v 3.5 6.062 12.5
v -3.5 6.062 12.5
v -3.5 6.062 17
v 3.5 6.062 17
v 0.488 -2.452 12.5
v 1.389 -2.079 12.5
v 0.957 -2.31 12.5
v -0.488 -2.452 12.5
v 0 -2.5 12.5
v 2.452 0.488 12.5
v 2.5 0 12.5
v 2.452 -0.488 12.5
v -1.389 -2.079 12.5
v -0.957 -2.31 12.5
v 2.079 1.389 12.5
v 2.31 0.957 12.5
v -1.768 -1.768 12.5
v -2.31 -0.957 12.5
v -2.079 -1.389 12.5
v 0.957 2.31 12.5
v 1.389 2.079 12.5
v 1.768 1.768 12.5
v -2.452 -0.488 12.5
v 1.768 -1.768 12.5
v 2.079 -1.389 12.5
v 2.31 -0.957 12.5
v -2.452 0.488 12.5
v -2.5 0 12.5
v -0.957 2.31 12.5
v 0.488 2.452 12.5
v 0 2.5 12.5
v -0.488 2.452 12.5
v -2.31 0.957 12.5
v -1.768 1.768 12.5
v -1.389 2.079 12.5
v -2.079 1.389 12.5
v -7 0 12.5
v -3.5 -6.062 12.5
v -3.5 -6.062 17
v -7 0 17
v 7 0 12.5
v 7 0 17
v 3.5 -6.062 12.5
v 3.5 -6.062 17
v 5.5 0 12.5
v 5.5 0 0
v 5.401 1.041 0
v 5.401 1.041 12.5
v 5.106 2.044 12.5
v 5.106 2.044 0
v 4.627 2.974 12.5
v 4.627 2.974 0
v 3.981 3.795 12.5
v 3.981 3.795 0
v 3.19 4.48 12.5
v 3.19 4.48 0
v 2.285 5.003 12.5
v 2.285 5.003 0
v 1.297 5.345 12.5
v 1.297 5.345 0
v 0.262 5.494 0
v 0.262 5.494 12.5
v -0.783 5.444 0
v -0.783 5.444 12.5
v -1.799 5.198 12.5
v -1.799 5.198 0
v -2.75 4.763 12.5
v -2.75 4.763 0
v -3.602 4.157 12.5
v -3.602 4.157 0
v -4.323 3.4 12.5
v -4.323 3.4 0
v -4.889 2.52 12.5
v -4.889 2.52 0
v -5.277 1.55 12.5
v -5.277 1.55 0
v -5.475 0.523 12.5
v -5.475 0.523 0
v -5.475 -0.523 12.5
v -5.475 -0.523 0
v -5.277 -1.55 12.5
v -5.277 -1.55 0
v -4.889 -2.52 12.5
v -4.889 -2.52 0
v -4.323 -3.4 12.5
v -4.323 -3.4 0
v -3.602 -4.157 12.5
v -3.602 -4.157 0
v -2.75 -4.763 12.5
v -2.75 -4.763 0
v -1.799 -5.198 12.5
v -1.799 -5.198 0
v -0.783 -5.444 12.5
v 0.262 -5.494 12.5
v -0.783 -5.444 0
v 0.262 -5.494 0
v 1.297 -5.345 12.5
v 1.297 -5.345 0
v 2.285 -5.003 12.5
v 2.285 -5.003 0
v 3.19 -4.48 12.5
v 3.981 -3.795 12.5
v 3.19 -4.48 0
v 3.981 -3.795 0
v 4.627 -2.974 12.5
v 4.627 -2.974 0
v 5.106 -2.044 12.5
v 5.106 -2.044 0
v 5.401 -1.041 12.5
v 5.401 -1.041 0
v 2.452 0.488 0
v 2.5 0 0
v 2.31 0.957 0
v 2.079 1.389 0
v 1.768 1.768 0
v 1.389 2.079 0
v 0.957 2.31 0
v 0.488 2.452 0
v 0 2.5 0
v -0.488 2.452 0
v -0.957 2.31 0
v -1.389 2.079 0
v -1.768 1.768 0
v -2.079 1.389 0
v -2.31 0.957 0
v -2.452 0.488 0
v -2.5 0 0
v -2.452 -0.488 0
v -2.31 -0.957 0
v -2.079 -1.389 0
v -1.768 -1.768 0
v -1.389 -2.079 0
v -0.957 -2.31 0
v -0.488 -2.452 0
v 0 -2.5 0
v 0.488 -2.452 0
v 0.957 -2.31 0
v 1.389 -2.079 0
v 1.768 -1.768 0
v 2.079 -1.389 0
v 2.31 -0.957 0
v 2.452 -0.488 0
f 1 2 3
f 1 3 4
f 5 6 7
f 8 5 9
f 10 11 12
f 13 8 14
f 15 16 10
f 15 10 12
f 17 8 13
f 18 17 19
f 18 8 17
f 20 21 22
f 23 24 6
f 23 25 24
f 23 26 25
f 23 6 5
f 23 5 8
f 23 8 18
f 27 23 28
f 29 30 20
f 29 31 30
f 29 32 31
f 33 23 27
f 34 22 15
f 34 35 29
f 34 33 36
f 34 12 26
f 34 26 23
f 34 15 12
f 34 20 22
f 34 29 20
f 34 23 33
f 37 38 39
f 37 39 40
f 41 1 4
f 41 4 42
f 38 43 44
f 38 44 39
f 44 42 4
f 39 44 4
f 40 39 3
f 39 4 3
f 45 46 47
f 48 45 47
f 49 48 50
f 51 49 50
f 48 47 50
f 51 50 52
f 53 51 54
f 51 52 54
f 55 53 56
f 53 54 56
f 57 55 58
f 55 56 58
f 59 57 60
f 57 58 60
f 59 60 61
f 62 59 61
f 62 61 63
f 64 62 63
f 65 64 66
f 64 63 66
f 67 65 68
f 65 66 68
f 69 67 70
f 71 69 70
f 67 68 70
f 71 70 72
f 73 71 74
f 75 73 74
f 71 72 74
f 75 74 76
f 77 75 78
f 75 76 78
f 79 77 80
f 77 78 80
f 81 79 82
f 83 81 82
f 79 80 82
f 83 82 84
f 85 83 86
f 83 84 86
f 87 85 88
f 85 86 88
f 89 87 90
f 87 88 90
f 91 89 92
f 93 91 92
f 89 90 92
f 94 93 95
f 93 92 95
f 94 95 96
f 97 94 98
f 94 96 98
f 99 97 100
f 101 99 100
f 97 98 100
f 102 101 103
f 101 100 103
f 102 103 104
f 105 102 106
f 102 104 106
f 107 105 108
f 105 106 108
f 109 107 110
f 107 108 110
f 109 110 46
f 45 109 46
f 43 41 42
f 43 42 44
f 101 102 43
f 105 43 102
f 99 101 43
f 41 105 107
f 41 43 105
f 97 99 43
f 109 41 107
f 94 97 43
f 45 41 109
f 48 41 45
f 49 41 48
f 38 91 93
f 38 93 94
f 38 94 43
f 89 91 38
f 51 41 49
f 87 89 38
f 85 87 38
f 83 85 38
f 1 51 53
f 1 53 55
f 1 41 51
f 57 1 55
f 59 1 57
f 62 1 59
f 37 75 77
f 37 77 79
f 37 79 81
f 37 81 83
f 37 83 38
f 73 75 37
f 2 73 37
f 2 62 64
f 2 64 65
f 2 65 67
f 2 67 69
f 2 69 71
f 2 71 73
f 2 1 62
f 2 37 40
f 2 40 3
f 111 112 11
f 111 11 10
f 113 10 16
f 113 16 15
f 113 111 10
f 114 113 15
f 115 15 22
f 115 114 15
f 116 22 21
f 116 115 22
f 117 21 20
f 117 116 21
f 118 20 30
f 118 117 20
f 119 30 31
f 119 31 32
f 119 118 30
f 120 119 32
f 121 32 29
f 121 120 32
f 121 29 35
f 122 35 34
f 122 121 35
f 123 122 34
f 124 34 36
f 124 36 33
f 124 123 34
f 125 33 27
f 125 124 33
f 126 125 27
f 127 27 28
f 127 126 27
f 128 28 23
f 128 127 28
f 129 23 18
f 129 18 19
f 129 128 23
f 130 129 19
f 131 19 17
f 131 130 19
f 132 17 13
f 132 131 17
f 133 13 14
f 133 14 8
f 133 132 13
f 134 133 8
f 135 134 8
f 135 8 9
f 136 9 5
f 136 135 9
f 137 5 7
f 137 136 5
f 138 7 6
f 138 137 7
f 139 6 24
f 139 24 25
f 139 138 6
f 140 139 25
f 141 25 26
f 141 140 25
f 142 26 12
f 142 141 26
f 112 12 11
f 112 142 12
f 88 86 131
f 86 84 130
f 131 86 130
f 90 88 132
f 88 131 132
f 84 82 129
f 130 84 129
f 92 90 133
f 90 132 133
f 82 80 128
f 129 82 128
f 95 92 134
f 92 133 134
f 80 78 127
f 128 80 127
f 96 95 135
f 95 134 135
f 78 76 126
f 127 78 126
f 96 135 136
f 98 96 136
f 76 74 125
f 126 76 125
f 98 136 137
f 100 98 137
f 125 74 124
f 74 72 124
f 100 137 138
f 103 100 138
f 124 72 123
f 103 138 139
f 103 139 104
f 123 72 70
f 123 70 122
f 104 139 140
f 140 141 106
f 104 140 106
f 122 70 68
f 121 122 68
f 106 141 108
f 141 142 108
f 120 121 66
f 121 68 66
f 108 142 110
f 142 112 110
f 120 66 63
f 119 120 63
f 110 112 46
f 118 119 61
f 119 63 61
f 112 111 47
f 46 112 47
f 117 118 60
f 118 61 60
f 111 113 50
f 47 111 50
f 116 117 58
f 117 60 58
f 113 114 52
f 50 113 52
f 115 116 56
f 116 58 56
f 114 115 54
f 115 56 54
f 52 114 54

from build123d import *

# Parameters (mm, degrees)
SKETCH_1_R      = 5.5
SKETCH_1_R_2    = 2.5
EXTRUDE_1_DEPTH = 12.5
EXTRUDE_2_DEPTH = 4.5


with BuildPart() as part:
    # 草图1 → 凸台-拉伸1 (new body)
    with BuildSketch(Plane.XY):
        Circle(SKETCH_1_R)
        Circle(SKETCH_1_R_2, mode=Mode.SUBTRACT)
    extrude(amount=EXTRUDE_1_DEPTH)

    # 草图2 → 凸台-拉伸2 (add)
    with BuildSketch(Plane.XY.offset(12.5)):
        Polygon((-3.5, 6.062177826), (3.5, 6.062177826), (7, 0), (3.5, -6.062177826), (-3.5, -6.062177826), (-7, 0), align=None)
    extrude(amount=EXTRUDE_2_DEPTH)


solid = part.part
